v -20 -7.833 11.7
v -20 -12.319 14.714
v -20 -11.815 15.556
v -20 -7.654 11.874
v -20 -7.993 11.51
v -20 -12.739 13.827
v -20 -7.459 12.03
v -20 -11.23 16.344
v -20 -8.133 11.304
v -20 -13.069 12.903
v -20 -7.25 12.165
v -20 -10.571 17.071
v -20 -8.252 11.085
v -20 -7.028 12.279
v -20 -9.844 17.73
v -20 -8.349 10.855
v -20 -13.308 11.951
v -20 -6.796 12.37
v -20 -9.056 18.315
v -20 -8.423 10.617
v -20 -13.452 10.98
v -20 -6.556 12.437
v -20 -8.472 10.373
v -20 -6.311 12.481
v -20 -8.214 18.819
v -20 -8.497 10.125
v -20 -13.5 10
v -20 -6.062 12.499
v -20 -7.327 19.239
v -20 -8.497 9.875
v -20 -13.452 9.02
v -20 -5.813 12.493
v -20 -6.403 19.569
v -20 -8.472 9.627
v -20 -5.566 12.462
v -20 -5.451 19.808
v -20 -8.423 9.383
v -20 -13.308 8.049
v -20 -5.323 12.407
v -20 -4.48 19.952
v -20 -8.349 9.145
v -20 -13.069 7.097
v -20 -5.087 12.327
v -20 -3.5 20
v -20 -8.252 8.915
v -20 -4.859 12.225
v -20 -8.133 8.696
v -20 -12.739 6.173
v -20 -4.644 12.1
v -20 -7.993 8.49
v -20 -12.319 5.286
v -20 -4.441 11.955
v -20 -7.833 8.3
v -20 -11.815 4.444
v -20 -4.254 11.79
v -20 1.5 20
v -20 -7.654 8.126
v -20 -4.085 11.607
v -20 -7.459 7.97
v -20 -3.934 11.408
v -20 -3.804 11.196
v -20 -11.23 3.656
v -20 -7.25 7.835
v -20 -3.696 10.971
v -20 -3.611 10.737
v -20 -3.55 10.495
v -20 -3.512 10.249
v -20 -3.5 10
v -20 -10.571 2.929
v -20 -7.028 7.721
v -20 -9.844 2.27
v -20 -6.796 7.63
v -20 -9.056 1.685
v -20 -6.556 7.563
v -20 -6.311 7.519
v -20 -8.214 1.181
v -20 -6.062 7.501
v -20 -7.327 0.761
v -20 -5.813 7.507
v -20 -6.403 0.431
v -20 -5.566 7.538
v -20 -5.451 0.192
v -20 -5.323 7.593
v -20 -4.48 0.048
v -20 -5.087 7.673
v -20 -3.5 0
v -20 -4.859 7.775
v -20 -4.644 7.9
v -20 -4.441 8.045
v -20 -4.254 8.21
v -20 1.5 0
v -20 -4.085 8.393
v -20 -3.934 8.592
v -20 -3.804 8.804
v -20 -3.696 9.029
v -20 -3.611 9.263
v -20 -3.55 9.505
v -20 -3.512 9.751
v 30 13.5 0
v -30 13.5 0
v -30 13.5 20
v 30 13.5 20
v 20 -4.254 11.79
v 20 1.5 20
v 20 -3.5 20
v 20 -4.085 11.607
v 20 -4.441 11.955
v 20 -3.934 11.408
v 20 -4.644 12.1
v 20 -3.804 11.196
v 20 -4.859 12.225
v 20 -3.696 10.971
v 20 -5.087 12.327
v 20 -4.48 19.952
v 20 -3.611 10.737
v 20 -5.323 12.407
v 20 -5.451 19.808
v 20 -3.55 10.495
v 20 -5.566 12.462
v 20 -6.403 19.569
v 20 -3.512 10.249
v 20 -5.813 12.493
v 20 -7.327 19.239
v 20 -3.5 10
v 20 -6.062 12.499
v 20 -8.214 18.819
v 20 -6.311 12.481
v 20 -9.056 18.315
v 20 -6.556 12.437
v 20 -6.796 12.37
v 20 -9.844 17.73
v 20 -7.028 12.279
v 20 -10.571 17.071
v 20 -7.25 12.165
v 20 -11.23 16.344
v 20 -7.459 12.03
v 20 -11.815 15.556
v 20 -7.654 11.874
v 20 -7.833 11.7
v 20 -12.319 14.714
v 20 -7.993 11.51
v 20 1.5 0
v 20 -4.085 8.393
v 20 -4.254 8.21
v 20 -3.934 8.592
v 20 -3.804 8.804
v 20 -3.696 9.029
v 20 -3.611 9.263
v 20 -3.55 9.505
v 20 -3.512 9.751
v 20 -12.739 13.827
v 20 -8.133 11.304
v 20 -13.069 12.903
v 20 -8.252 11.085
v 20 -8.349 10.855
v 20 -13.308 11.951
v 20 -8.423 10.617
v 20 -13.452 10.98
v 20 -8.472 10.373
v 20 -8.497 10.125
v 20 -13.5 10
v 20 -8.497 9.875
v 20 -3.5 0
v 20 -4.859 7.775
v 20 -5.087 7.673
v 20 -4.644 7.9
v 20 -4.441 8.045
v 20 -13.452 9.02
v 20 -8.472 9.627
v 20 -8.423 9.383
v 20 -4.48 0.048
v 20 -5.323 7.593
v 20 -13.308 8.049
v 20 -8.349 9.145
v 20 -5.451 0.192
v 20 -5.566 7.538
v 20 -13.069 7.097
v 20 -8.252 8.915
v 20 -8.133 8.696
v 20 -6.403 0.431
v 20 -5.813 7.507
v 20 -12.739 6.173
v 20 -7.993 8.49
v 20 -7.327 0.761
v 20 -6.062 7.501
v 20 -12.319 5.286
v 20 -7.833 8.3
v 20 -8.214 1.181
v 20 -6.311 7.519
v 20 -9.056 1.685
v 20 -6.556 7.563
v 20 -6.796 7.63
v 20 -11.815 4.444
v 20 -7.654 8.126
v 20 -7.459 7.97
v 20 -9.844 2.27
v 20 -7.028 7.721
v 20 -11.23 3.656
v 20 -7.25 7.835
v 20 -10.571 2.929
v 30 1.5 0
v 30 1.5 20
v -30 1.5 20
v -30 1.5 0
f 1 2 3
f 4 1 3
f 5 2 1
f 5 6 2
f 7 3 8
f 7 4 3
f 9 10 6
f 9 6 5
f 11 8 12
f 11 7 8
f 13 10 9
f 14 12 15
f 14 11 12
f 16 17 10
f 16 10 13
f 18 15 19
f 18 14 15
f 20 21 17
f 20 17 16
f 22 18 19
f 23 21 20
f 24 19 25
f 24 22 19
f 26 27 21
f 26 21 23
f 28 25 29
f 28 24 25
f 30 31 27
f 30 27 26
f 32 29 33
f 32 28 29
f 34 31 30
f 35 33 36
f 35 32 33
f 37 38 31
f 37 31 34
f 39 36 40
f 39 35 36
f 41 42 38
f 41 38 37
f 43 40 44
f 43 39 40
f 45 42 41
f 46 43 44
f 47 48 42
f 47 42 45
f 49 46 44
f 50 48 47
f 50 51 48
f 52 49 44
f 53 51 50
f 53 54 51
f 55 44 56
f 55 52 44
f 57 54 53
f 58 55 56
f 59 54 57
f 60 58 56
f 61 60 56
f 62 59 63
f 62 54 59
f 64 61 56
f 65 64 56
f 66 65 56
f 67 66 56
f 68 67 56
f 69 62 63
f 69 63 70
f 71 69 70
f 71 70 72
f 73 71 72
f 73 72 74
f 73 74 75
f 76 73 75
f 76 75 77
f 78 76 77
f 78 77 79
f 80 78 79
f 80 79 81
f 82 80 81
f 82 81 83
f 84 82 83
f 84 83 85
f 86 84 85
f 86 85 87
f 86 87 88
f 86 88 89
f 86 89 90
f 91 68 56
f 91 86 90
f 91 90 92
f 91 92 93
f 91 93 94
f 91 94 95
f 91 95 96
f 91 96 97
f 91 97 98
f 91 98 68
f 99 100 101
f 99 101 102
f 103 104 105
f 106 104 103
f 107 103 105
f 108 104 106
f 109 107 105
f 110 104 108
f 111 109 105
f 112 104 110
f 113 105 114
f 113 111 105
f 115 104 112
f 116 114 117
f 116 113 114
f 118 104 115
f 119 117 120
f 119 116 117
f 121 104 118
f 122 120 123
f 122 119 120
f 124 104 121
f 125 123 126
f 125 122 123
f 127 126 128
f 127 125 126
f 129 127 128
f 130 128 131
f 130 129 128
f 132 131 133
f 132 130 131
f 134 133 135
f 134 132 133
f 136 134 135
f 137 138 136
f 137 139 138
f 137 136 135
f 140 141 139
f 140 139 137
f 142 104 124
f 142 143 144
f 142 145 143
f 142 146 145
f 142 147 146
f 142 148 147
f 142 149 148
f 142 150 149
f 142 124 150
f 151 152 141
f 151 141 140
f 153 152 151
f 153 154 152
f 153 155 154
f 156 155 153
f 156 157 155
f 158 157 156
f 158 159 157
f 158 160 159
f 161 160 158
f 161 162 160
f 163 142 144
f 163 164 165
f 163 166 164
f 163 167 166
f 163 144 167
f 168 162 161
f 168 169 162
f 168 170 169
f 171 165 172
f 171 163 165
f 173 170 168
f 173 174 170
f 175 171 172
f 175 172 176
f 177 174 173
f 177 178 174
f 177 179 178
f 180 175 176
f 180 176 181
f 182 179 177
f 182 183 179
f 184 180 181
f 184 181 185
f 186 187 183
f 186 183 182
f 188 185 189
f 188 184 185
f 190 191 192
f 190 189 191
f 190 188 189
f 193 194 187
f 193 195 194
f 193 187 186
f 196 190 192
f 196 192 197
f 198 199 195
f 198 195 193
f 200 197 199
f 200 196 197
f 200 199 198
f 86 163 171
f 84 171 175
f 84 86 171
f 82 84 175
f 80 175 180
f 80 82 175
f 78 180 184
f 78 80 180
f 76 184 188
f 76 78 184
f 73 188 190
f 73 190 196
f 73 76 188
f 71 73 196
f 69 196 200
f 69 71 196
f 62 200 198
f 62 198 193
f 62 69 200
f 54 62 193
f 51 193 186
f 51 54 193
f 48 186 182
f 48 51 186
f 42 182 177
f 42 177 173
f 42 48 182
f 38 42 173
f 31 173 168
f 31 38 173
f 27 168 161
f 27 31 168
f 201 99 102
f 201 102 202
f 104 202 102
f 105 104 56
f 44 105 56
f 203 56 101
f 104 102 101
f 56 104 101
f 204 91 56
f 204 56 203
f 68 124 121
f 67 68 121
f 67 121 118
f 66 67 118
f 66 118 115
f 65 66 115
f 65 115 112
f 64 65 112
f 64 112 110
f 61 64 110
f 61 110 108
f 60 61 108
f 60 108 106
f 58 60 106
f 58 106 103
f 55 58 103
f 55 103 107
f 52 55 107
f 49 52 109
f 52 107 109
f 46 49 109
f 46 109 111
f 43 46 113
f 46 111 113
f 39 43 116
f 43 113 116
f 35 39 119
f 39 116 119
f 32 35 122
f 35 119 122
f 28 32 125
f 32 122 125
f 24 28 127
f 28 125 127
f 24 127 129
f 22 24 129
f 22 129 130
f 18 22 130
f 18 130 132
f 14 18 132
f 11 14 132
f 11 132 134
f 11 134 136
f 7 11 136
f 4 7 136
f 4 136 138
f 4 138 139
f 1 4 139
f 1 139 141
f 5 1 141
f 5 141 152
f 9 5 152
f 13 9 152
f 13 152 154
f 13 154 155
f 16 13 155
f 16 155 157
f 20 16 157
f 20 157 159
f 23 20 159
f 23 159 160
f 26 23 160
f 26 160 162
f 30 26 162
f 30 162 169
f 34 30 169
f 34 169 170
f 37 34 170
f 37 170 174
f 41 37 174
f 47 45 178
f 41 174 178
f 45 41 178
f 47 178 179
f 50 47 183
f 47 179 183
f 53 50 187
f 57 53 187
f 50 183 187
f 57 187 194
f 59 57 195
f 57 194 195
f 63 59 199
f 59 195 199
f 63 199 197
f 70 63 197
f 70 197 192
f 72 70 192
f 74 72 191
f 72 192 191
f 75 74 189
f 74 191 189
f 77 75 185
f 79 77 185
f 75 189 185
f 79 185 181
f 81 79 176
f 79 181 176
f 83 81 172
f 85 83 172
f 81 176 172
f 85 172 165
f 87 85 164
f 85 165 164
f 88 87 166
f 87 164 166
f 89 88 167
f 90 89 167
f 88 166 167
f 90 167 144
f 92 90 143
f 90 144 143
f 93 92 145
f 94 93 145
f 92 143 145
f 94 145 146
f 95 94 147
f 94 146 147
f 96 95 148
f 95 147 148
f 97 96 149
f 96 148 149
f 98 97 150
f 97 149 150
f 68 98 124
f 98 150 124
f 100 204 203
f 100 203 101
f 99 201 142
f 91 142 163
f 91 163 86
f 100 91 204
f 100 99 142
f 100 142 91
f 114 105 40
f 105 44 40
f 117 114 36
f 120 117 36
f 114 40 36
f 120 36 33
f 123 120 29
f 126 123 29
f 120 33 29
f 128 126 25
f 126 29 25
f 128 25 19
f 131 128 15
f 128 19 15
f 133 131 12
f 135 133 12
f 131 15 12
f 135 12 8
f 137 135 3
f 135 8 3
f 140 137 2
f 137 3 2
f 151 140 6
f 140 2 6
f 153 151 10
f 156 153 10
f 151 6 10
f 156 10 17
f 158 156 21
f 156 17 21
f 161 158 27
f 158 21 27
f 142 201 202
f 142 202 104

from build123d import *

# Parameters (mm, degrees)
BOSS_EXTRUDE1_DEPTH = 20
SKETCH2_R           = 2.5
CUT_EXTRUDE1_DEPTH  = 56.518015094
FILLET1_R           = 10


with BuildPart() as part:
    # Sketch1 → Boss-Extrude1 (new body)
    with BuildSketch(Plane.XY):
        Polygon((-30, 13.5), (30, 13.5), (30, 1.5), (20, 1.5), (20, -13.5), (-20, -13.5), (-20, 1.5), (-30, 1.5), align=None)
    extrude(amount=BOSS_EXTRUDE1_DEPTH)

    # Sketch2 → Cut-Extrude1 (cut, through all)
    with BuildSketch(Plane(origin=(20, 0, 0), x_dir=(0, 0, -1), z_dir=(1, 0, 0))):
        with Locations(Location((-10, -6, 0), (0, 0, 90))):
            Circle(SKETCH2_R)
    extrude(amount=-CUT_EXTRUDE1_DEPTH, mode=Mode.SUBTRACT)

    # Fillet1
    fillet1_edges = [part.edges().sort_by_distance(p)[0] for p in [
        (0, -13.5, 0),
        (0, -13.5, 20),
    ]]
    fillet(fillet1_edges, radius=FILLET1_R - 0.0001)  # a hair under: the kernel refuses the full size


solid = part.part
